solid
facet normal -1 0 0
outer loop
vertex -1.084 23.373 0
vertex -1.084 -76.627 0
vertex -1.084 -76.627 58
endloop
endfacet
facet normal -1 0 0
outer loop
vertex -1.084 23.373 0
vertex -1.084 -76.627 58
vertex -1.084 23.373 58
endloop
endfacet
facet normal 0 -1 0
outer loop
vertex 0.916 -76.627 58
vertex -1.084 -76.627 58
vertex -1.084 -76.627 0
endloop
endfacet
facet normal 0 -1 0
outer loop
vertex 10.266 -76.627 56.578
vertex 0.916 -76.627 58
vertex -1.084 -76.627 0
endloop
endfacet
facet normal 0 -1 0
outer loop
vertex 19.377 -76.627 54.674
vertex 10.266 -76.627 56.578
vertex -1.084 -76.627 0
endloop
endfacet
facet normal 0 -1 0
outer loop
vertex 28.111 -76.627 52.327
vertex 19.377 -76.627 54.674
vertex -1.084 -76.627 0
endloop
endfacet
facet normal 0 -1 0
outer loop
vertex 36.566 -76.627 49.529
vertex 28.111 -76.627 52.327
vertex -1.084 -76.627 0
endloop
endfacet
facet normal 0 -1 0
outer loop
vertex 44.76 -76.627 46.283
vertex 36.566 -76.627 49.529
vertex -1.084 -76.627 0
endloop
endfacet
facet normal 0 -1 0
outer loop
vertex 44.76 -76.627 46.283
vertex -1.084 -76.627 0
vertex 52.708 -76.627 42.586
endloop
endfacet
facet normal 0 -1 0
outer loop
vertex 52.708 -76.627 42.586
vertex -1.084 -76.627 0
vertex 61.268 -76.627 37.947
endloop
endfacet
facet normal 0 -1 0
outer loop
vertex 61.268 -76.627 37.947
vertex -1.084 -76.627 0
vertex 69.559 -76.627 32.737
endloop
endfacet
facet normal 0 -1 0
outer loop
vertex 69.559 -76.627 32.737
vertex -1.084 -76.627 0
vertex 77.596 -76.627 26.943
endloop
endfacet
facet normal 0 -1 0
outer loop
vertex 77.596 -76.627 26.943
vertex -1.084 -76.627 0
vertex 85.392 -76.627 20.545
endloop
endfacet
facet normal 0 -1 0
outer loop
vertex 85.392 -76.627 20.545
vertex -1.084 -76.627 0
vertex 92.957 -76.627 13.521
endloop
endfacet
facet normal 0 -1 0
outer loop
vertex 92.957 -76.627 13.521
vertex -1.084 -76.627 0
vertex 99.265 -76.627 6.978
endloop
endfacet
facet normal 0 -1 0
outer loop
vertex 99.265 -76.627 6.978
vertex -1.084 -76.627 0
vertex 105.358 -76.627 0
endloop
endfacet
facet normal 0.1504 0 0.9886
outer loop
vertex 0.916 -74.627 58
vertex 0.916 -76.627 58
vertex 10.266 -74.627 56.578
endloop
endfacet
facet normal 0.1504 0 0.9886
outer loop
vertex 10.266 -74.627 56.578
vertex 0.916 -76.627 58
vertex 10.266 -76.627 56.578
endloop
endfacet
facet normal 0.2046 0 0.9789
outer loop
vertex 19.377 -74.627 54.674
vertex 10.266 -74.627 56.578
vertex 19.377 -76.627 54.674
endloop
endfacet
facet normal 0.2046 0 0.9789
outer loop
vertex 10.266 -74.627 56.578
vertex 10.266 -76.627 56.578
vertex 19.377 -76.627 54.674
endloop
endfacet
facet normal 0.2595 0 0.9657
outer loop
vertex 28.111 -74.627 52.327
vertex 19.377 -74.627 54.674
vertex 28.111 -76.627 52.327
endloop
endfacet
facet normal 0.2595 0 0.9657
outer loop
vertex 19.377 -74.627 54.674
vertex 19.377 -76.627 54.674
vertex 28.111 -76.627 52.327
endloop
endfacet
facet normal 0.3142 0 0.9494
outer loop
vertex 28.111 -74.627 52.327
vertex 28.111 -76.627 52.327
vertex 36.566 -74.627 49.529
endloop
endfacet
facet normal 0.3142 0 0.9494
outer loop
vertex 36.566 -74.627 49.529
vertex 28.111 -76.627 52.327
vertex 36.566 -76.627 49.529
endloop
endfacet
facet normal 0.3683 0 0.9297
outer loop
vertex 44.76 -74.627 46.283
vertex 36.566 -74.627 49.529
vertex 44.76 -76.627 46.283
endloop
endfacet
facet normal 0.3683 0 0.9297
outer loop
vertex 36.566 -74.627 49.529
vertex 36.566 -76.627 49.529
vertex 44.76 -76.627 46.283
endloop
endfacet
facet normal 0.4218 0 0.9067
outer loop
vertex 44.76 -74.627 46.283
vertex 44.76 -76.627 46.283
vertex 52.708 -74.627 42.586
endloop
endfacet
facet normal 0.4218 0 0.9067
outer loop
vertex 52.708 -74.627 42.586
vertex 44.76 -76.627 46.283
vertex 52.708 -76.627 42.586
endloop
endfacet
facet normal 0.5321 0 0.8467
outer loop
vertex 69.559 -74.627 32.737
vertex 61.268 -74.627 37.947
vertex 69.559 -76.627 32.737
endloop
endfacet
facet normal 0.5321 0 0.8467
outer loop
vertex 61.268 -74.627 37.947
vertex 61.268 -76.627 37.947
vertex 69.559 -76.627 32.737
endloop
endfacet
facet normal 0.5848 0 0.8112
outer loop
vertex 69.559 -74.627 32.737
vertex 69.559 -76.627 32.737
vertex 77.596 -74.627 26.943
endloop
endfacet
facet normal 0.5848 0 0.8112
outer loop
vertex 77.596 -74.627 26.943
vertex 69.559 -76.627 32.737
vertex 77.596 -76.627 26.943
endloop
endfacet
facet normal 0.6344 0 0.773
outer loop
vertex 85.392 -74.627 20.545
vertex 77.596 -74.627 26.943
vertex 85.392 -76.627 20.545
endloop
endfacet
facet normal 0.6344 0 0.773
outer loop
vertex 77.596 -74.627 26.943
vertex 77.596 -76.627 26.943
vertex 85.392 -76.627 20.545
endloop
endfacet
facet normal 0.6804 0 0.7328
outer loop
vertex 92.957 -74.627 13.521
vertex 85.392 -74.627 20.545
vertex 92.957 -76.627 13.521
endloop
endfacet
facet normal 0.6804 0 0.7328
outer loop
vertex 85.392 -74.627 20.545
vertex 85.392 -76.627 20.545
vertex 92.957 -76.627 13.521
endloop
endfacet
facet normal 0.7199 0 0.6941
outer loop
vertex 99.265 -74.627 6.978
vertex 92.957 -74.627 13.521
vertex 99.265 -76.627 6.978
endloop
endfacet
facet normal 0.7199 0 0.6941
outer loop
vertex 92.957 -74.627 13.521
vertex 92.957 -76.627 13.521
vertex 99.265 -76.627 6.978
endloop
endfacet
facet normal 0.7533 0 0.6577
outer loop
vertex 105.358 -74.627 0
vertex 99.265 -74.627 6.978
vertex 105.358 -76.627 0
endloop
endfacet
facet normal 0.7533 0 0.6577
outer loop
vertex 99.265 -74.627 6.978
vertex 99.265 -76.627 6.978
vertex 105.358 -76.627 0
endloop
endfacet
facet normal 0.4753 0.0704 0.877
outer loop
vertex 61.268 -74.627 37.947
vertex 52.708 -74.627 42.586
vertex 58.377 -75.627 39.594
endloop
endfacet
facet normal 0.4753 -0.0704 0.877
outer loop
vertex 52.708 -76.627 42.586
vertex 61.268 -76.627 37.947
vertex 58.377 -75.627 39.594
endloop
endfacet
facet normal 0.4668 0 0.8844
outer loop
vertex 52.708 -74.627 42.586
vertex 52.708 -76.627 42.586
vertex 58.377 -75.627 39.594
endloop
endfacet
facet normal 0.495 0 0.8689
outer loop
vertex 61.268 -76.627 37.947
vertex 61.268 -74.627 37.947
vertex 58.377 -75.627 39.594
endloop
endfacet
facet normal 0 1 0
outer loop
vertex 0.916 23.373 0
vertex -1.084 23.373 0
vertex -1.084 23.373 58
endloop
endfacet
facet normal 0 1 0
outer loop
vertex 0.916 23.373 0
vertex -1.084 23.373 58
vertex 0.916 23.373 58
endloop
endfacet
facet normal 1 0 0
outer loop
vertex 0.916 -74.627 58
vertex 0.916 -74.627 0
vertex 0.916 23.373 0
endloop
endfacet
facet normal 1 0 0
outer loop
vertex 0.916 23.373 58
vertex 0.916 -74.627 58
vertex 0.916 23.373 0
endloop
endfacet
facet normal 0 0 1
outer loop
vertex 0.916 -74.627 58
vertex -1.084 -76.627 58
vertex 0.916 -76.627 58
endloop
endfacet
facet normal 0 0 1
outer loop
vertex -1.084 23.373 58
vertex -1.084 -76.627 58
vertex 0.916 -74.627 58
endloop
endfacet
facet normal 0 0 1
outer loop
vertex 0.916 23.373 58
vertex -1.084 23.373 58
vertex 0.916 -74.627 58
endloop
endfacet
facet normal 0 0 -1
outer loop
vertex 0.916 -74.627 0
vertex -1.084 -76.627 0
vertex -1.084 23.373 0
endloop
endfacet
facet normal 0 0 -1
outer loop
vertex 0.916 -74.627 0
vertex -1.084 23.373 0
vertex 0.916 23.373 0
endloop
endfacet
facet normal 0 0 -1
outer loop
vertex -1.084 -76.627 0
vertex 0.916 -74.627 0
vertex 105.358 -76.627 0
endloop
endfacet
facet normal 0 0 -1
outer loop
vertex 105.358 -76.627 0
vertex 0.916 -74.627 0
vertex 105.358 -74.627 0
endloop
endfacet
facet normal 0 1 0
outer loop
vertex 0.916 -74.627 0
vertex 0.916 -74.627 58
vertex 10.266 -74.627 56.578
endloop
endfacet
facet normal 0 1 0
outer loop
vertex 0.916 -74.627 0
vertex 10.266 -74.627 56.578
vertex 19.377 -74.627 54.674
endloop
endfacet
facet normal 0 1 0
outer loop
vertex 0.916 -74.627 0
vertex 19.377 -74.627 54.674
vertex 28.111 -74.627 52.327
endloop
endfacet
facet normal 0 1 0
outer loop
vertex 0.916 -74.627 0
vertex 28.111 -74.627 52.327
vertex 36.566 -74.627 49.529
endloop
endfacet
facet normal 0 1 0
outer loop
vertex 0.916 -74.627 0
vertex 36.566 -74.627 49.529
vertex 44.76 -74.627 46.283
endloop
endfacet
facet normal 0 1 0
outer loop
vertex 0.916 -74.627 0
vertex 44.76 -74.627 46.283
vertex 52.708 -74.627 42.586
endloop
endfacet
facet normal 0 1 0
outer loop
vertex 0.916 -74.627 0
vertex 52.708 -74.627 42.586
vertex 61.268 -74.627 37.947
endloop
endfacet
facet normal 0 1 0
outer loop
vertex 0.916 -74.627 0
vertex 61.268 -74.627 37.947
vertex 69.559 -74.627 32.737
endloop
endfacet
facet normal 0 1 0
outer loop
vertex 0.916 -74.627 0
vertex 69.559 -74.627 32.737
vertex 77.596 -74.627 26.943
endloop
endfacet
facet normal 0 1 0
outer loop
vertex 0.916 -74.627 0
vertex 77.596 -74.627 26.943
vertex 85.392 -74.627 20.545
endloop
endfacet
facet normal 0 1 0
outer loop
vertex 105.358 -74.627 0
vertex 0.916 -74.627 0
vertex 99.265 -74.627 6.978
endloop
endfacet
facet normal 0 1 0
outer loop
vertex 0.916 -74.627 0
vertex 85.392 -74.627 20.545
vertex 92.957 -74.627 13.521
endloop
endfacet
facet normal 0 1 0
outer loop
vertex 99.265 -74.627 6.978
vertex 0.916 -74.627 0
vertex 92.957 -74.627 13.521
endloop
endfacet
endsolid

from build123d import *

# Parameters (mm, degrees)
SKETCH1_W           = 2
SKETCH1_H           = 100
BOSS_EXTRUDE1_DEPTH = 58
BOSS_EXTRUDE2_DEPTH = 2


with BuildPart() as part:
    # Sketch1 → Boss-Extrude1 (new body)
    with BuildSketch(Plane.XY):
        with Locations((-0.084337349, -26.626506024)):
            Rectangle(SKETCH1_W, SKETCH1_H)
    extrude(amount=BOSS_EXTRUDE1_DEPTH)

    # Sketch2 → Boss-Extrude2 (add)
    with BuildSketch(Plane.XZ.offset(76.626506024)):
        with BuildLine():
            Line((0.915662651, 58), (-1.084337349, 58))
            Line((-1.084337349, 58), (-1.084337349, 0))
            Line((-1.084337349, 0), (105.357714941, 0))
            add(Edge.make_bspline(
                [(0.915662651, 58), (63.617404925, 50.187924703), (105.357714941, 0)],
                knots=[0, 0, 0, 1, 1, 1], degree=2))
        make_face()
    extrude(amount=-BOSS_EXTRUDE2_DEPTH)


solid = part.part
